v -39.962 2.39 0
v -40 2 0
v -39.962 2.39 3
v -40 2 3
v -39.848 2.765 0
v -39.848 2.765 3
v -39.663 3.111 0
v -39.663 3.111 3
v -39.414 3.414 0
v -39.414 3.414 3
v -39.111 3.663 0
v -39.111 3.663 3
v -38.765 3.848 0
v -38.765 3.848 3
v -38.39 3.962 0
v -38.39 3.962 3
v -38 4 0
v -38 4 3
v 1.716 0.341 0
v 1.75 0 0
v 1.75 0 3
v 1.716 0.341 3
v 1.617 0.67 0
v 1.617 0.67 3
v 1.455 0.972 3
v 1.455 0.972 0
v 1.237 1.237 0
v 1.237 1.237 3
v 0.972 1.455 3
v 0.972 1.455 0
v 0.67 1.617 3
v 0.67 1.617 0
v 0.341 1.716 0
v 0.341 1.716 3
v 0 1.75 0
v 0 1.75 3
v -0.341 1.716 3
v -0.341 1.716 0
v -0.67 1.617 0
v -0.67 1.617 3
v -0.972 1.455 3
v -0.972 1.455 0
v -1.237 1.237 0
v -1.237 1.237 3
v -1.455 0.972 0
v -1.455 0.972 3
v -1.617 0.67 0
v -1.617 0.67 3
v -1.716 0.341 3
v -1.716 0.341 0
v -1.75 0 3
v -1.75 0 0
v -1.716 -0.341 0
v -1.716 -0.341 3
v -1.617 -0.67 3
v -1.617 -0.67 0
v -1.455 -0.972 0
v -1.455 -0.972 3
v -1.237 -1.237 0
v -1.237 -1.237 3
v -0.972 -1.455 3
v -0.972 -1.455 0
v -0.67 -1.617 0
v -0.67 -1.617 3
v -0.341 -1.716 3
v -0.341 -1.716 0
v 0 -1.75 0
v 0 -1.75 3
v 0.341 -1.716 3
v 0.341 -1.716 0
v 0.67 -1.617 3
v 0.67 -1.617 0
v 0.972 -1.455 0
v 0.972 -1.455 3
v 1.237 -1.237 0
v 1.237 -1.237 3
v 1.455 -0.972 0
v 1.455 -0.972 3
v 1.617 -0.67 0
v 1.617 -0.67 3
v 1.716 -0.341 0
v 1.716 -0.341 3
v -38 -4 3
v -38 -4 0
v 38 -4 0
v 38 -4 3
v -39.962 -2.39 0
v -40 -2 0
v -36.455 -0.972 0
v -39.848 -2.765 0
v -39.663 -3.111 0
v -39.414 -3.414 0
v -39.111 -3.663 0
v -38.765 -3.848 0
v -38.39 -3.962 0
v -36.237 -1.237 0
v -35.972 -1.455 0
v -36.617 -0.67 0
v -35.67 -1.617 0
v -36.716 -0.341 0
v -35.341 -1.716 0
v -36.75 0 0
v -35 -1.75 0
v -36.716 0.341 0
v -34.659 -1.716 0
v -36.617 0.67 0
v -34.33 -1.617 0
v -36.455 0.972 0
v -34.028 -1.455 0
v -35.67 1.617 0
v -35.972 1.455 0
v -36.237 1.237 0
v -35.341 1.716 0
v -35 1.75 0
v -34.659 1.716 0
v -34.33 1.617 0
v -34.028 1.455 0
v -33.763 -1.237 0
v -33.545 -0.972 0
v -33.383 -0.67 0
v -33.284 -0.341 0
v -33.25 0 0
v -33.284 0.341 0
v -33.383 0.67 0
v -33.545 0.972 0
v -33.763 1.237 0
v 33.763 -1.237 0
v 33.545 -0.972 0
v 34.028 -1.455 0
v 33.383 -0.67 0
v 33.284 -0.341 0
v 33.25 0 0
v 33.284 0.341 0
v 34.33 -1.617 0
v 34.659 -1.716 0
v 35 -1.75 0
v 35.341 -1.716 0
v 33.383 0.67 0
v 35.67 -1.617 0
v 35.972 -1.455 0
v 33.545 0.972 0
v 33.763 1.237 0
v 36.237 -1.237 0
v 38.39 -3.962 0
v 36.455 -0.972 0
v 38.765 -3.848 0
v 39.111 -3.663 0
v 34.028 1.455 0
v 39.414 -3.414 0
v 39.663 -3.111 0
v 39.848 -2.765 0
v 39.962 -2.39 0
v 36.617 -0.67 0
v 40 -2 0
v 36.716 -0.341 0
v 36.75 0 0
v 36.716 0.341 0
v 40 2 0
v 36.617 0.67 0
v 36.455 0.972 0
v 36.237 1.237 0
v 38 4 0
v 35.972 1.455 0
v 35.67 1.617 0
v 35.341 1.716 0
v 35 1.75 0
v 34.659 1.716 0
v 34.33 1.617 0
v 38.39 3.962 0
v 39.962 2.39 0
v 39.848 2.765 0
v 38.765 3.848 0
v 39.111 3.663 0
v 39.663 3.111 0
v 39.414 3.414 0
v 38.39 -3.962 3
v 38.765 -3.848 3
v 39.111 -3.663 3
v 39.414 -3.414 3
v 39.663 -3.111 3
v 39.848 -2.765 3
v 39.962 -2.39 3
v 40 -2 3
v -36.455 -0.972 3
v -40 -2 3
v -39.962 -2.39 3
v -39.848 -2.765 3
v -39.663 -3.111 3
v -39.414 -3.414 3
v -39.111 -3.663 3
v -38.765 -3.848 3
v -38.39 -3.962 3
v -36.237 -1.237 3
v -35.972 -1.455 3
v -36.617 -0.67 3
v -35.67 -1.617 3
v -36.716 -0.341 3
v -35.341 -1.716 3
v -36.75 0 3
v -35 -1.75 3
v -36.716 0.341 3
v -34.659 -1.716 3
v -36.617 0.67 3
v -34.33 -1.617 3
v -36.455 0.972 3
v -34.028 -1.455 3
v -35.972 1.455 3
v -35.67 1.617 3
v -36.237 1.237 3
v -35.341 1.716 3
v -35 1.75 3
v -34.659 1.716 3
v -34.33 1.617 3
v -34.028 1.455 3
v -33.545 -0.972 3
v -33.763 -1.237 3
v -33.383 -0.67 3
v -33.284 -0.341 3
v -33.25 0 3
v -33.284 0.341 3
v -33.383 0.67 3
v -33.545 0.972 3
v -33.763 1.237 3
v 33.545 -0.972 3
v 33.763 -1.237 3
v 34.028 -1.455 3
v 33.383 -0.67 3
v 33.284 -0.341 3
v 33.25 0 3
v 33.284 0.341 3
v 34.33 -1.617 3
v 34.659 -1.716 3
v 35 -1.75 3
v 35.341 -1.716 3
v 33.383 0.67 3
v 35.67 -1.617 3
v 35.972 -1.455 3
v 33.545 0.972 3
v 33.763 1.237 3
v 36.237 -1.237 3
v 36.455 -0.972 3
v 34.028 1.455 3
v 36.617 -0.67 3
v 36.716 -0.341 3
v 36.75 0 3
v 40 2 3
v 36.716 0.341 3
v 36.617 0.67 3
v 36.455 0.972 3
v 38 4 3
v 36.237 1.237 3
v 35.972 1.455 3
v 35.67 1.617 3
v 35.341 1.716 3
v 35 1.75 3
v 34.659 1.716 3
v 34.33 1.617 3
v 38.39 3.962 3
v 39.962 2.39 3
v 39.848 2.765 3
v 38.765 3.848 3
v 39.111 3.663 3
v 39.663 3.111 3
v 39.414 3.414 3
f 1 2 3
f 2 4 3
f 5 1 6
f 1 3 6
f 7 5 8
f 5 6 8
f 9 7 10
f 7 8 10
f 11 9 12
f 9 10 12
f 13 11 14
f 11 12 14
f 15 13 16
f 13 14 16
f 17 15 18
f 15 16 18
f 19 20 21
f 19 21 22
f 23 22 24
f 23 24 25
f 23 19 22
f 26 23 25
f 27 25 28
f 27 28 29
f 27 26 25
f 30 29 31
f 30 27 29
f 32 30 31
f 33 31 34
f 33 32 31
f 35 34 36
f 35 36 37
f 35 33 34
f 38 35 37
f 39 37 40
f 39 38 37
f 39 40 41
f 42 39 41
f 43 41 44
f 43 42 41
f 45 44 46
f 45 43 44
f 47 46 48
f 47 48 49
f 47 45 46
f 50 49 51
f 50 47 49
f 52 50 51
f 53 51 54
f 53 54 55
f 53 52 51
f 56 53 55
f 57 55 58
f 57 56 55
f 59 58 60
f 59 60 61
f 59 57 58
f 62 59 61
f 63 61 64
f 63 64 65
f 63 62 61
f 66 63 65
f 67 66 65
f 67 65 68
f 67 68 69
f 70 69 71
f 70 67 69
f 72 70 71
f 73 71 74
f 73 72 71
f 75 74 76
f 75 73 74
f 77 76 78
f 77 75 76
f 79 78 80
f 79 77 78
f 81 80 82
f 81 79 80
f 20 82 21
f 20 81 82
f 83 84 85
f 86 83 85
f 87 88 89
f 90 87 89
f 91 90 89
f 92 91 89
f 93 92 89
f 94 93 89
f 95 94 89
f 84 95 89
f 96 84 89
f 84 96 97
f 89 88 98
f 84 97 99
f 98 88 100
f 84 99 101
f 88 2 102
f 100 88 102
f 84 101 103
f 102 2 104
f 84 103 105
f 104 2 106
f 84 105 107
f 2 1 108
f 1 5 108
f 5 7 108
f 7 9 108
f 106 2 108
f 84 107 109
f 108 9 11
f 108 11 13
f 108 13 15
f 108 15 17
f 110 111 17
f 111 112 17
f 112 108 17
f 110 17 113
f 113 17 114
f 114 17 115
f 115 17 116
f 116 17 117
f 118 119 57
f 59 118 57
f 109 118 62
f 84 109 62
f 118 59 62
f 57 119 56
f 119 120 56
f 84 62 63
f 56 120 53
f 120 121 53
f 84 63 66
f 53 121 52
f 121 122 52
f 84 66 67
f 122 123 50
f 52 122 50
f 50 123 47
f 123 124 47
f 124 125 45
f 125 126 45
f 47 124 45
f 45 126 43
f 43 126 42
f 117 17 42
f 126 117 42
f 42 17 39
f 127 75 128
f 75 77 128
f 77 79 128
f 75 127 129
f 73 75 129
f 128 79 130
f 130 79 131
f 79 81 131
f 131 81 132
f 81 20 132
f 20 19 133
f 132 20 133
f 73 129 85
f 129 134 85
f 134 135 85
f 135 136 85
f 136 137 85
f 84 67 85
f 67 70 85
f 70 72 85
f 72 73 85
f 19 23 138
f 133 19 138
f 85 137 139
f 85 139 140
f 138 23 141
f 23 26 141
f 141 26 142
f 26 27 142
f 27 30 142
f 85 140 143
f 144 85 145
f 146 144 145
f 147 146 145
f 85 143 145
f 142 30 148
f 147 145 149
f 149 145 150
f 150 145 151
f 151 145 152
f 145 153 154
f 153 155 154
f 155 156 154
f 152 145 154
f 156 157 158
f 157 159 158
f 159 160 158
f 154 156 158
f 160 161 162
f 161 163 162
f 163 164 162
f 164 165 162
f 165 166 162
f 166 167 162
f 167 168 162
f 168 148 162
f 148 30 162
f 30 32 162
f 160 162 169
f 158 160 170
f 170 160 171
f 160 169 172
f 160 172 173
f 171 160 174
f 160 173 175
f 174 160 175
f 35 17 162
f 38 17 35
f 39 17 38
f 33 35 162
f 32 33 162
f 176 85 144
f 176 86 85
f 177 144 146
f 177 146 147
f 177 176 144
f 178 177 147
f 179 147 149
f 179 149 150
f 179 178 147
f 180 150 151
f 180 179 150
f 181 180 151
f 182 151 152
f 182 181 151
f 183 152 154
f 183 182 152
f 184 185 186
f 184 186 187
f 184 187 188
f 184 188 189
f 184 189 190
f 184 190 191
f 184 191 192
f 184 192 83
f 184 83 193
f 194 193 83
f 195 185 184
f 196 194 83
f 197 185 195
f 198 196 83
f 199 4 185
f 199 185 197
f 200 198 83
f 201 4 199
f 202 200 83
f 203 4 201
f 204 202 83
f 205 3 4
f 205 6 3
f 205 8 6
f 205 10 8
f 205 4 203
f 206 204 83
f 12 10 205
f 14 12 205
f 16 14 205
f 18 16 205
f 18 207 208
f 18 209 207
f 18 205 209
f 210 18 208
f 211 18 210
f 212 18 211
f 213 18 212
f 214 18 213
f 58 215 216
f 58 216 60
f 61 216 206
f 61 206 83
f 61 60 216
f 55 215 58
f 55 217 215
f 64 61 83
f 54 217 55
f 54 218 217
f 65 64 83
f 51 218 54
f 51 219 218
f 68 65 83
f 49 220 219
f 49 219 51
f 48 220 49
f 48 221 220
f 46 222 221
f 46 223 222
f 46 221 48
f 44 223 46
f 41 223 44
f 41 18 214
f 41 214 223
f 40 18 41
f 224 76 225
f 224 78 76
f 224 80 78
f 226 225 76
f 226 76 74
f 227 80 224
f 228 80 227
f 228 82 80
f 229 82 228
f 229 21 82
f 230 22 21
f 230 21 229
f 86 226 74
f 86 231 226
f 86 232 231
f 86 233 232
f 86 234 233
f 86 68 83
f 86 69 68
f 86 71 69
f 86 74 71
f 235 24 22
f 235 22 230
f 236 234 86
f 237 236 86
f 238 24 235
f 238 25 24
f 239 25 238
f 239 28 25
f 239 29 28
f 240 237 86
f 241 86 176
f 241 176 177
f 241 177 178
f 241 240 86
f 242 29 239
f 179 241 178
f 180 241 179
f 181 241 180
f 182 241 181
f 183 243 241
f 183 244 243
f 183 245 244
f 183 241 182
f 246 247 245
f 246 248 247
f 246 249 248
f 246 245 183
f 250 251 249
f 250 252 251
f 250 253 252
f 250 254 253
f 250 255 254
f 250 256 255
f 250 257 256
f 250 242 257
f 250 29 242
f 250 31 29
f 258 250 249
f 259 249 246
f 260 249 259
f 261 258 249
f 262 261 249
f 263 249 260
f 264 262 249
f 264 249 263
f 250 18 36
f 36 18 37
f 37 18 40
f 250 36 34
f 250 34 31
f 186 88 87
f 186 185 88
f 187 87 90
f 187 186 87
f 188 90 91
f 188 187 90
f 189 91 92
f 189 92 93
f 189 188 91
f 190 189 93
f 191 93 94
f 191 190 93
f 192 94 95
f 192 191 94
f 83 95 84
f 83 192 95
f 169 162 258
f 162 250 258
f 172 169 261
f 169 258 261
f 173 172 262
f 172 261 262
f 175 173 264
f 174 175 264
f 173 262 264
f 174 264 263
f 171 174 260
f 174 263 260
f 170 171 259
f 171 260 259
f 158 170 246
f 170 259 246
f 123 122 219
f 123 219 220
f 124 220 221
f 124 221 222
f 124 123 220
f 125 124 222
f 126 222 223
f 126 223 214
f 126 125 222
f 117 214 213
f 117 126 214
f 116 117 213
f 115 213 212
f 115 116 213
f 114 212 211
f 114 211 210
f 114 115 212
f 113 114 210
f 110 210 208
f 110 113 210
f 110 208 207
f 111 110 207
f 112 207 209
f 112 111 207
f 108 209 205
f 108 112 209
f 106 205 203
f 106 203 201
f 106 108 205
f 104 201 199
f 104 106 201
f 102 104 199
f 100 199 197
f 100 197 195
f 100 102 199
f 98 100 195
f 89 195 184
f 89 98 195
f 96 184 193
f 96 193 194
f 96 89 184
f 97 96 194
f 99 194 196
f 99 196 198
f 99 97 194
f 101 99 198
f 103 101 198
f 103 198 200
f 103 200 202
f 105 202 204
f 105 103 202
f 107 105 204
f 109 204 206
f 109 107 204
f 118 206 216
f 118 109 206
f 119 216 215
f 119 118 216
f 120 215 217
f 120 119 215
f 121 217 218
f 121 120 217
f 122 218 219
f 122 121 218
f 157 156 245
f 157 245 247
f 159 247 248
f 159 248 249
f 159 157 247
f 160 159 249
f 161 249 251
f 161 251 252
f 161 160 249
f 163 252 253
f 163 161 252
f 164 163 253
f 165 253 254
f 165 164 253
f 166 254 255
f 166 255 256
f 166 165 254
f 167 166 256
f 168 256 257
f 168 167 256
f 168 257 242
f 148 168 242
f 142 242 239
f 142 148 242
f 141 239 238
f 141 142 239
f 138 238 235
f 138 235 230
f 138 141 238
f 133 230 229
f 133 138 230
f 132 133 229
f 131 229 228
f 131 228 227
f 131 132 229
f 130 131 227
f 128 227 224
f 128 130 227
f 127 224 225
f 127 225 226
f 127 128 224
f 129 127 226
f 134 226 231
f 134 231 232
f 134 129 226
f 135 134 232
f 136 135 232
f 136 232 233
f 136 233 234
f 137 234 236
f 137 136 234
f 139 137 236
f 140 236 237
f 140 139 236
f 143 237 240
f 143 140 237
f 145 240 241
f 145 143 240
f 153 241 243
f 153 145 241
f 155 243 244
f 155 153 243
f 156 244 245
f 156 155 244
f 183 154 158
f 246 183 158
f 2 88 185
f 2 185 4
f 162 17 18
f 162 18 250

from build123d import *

# Parameters (mm, degrees)
F0_W     = 80
F0_H     = 8
F0_R     = 1.75
F1_DEPTH = 3
F2_R     = 2


with BuildPart() as f1:
    # F0 (on Top) → F1 (new body)
    with BuildSketch(Plane.XY):
        Rectangle(F0_W, F0_H)
        with Locations((-35, 0)):
            Circle(F0_R, mode=Mode.SUBTRACT)
        Circle(F0_R, mode=Mode.SUBTRACT)
        with Locations((35, 0)):
            Circle(F0_R, mode=Mode.SUBTRACT)
    extrude(amount=F1_DEPTH)

    # F2
    f2_edges = [f1.edges().sort_by_distance(p)[0] for p in [
        (-40, -4, 1.5),
        (40, -4, 1.5),
        (40, 4, 1.5),
        (-40, 4, 1.5),
    ]]
    fillet(f2_edges, radius=F2_R)


solid = f1.part
